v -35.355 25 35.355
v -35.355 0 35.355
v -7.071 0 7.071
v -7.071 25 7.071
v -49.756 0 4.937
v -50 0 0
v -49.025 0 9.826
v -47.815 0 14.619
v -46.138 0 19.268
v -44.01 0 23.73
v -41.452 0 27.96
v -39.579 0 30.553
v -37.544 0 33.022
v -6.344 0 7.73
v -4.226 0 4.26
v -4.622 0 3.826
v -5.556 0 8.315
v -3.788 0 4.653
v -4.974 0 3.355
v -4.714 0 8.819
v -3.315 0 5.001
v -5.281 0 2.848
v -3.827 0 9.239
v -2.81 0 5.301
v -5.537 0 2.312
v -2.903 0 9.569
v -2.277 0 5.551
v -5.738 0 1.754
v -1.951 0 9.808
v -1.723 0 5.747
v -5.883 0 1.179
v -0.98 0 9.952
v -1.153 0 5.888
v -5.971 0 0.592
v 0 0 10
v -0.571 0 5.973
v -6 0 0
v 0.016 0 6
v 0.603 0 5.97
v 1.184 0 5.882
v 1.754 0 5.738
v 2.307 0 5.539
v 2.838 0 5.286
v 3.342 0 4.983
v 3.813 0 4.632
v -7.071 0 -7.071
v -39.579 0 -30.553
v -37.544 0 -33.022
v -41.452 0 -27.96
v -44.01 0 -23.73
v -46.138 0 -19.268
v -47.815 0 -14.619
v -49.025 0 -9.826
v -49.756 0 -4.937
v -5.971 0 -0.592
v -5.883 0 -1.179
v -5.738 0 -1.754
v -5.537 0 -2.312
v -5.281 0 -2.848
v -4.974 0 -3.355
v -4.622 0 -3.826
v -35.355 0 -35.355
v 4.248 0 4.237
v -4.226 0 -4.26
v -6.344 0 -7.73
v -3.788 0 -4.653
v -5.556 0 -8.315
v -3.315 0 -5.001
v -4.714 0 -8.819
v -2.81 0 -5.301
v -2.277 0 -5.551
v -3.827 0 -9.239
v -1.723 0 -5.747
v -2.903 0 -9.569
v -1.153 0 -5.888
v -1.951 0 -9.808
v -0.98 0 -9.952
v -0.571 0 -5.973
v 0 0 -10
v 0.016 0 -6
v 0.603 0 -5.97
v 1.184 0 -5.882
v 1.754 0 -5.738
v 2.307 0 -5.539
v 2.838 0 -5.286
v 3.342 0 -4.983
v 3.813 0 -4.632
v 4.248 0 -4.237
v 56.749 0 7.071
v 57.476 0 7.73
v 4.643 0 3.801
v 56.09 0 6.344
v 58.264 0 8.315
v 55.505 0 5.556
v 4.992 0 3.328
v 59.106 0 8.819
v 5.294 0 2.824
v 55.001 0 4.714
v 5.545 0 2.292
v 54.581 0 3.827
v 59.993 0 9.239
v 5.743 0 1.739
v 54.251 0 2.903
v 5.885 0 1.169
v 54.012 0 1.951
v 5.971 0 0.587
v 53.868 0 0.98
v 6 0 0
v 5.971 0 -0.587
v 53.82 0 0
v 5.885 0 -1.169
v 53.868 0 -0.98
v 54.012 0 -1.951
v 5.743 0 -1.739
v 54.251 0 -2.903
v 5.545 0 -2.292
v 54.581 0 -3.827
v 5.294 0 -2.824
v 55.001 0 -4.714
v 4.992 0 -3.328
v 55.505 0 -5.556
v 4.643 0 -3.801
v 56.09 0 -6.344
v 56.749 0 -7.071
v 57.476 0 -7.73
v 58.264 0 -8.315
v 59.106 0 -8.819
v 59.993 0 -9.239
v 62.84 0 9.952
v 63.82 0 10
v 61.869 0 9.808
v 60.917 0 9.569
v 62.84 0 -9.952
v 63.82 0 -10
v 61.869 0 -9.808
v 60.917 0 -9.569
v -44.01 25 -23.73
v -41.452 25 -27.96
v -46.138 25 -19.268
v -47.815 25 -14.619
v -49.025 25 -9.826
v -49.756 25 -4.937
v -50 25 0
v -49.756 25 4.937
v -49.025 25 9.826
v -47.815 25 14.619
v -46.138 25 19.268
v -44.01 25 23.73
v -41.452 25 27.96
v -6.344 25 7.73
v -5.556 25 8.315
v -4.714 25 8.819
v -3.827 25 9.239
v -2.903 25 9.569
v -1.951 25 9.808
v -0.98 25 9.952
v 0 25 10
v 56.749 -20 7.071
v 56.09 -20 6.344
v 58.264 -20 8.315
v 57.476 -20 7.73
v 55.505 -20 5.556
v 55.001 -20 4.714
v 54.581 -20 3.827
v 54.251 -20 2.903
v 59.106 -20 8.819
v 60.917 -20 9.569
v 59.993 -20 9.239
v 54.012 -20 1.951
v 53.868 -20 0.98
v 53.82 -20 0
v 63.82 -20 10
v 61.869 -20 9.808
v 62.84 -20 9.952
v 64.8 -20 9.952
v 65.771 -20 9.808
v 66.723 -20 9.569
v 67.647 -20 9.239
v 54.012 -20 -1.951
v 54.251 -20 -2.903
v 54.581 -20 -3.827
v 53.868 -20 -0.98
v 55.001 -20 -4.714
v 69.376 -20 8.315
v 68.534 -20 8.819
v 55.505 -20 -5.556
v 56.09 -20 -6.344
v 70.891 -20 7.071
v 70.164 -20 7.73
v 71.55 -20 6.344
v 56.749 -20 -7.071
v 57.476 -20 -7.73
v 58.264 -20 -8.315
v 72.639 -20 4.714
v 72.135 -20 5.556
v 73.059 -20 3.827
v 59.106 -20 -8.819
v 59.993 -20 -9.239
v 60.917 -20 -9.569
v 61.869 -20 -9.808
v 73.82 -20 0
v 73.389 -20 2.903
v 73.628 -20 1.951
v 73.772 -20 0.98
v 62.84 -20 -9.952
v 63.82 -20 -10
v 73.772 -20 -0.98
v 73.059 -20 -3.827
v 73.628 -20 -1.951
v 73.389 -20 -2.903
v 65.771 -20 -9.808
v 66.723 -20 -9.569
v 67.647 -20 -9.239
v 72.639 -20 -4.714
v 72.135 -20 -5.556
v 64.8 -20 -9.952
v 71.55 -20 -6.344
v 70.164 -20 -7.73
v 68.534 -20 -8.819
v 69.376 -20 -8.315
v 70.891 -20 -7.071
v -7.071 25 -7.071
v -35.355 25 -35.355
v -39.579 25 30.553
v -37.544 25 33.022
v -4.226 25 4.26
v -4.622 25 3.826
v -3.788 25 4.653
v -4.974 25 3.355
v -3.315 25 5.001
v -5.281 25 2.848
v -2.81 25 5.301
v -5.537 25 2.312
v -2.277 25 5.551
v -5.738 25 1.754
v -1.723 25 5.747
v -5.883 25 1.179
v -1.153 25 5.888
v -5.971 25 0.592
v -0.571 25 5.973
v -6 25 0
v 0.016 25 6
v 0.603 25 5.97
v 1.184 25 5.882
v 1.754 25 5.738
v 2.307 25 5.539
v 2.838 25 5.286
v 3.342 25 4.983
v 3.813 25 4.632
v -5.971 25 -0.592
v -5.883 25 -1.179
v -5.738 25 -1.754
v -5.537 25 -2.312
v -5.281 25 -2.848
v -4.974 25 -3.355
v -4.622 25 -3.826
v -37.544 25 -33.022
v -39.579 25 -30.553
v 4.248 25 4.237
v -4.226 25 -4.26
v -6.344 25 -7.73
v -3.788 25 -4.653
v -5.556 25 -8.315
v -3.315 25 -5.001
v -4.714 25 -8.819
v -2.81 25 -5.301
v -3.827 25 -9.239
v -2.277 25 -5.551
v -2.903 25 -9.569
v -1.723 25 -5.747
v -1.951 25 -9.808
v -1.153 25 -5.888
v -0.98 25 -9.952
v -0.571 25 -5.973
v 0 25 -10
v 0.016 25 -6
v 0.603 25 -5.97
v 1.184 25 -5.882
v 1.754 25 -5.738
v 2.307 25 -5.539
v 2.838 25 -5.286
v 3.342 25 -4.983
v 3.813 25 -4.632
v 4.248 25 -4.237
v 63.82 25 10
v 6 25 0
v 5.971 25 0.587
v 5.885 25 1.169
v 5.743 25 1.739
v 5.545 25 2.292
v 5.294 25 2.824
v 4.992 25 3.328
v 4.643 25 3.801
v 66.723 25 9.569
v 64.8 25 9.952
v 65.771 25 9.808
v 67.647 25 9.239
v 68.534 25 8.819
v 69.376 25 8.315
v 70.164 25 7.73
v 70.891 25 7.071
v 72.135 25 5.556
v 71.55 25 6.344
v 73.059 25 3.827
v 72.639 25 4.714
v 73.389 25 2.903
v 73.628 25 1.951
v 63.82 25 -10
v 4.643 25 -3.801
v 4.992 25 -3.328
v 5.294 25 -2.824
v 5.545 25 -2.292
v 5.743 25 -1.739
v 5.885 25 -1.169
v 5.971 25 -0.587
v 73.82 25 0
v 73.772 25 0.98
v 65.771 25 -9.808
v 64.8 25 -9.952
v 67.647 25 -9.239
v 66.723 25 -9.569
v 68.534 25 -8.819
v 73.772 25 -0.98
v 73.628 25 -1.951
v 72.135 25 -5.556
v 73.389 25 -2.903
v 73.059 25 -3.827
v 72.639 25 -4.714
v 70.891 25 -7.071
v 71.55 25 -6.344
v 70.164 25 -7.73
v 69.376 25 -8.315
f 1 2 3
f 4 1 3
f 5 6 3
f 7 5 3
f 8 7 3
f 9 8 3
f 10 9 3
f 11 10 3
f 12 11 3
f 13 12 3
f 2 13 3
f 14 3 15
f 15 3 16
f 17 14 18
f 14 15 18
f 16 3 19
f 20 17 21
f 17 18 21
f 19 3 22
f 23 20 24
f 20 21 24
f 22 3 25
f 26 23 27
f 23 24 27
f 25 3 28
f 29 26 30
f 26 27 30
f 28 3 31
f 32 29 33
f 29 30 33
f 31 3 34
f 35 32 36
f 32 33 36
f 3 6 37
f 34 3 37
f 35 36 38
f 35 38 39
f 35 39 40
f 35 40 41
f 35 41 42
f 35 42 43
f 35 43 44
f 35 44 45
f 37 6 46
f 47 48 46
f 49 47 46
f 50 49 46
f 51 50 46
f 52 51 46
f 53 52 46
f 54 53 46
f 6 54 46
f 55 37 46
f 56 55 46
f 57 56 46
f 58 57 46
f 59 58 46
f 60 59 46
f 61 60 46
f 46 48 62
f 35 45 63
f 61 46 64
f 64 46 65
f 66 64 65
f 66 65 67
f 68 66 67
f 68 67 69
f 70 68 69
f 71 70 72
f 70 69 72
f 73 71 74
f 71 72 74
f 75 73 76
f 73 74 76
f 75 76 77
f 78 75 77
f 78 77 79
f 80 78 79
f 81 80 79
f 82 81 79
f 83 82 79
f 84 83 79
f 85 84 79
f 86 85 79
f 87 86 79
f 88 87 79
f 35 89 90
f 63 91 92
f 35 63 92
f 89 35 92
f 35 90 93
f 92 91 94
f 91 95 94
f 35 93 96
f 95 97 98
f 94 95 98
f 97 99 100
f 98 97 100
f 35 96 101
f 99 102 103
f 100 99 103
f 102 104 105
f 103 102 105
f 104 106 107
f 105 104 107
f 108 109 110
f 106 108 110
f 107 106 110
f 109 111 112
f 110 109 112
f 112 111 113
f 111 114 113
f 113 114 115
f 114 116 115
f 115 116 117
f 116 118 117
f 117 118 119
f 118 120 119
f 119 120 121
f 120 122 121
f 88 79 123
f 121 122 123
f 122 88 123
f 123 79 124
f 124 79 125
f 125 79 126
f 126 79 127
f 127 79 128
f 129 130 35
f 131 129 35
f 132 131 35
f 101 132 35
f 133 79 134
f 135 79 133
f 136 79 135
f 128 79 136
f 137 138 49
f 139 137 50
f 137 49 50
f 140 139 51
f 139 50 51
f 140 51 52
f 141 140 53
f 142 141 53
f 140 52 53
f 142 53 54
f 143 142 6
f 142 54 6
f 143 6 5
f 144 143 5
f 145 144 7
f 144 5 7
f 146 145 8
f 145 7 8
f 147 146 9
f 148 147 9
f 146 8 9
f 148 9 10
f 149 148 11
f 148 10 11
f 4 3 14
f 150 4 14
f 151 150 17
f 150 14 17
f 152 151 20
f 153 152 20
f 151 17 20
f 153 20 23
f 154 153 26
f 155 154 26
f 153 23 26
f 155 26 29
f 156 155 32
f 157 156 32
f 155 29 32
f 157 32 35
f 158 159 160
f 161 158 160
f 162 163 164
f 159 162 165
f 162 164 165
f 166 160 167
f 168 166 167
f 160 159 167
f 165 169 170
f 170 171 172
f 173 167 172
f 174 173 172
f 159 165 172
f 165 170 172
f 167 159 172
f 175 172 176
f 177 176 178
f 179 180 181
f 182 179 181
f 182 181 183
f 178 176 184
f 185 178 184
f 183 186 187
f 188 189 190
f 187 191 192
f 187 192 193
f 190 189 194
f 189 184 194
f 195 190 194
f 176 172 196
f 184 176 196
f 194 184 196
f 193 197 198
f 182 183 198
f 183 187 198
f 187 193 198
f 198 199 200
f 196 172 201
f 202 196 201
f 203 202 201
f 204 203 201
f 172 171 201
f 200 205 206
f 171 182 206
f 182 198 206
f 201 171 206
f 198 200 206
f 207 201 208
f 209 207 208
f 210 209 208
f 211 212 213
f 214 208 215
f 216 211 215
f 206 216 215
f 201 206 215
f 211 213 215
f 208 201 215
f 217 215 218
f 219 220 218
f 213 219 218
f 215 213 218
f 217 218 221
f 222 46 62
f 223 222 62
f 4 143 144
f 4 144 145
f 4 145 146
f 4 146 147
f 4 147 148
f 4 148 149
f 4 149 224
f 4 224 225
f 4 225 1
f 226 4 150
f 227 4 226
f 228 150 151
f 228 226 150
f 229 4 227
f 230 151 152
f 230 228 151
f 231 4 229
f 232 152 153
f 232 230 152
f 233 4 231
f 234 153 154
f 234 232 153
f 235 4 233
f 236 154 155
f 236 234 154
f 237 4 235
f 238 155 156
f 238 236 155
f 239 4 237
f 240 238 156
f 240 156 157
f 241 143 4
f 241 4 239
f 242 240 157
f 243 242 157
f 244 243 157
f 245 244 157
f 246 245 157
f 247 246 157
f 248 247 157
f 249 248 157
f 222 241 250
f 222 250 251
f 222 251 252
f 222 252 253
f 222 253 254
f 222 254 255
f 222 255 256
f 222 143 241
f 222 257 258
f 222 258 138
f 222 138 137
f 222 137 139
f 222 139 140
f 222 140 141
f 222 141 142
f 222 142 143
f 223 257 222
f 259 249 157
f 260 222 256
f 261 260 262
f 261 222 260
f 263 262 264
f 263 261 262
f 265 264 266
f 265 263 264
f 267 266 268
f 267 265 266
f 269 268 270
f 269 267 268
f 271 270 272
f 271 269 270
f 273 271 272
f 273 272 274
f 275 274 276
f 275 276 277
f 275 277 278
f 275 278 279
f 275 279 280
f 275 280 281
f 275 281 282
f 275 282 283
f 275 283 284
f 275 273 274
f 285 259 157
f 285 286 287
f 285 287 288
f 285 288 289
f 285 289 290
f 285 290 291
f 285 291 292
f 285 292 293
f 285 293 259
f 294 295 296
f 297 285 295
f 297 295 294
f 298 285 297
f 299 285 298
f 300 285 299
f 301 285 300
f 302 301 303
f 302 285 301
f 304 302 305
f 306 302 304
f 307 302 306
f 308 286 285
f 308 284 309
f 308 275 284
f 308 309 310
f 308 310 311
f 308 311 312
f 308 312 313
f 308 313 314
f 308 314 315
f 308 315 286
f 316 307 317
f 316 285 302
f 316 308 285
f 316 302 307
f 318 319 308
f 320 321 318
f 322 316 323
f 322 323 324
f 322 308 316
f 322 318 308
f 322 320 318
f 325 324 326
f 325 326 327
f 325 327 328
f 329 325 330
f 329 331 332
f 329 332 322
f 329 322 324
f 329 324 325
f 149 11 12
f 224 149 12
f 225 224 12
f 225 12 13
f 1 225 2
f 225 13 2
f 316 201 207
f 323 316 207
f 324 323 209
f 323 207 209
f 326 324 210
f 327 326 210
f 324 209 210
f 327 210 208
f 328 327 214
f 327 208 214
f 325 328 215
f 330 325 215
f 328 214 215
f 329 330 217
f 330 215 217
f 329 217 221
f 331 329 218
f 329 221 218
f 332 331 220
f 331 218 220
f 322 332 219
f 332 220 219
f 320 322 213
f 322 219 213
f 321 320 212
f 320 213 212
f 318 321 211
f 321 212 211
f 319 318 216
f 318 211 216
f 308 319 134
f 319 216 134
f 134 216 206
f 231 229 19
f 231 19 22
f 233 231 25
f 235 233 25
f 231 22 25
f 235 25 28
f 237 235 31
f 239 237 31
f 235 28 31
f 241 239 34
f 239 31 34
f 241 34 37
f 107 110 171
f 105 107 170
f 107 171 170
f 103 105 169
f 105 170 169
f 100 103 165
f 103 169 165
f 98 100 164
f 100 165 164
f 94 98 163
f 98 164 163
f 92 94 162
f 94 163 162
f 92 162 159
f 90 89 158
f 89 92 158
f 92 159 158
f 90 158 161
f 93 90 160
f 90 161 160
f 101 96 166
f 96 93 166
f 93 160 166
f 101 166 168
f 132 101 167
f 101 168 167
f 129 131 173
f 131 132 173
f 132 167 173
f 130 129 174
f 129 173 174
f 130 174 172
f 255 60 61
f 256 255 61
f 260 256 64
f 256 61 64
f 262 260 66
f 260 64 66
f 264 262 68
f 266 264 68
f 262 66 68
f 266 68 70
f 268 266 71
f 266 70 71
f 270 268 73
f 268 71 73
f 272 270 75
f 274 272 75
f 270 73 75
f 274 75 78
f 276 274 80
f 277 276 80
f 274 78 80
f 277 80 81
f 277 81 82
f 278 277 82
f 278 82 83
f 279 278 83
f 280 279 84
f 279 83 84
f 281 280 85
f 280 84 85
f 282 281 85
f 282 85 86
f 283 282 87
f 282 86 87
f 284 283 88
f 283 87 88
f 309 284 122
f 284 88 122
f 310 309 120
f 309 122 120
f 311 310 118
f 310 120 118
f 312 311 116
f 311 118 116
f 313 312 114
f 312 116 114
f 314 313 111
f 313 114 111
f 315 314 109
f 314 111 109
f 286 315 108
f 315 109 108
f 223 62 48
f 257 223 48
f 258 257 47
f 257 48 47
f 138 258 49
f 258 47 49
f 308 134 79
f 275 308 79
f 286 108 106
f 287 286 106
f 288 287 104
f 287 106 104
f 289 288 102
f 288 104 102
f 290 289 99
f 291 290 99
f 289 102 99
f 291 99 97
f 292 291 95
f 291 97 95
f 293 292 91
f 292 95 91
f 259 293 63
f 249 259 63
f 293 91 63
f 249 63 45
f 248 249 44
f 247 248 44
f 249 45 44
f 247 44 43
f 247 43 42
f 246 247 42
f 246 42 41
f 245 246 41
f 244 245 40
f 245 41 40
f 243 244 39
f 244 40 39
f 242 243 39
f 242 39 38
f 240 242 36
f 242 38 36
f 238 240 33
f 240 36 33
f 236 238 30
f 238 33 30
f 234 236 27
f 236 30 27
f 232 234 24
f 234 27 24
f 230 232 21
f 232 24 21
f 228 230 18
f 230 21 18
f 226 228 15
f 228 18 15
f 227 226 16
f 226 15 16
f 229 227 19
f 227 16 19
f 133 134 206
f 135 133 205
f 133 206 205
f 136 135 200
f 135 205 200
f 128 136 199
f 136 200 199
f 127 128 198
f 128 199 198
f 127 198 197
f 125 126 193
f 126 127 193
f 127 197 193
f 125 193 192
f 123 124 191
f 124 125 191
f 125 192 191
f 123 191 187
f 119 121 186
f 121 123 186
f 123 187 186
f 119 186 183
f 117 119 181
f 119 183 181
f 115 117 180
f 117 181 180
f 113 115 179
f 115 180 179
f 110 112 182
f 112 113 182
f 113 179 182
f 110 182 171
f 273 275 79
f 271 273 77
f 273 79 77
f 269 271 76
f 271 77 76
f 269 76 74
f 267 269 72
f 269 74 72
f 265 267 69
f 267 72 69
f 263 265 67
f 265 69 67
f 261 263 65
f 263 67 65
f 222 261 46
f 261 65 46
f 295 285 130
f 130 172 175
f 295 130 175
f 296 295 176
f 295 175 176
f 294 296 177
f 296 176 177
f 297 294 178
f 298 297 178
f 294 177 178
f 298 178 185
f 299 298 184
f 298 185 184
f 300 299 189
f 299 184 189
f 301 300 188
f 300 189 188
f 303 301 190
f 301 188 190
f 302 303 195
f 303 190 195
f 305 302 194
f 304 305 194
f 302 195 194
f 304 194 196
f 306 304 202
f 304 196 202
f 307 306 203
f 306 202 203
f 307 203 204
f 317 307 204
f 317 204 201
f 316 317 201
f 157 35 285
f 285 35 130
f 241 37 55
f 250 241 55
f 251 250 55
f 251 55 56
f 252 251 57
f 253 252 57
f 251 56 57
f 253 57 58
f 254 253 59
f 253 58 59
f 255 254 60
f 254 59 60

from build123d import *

# Parameters (mm, degrees)
SKETCH_2_R           = 6
EXTRUDE_1_DEPTH      = 25
EXTRUDE_2_DEPTH      = 25
EXTRUDE_2_DEPTH_BACK = 20
SKETCH_2_3_R         = 10
EXTRUDE_START        = -25
EXTRUDE_3_DEPTH      = 25


with BuildPart() as part:
    # 草图2 → 凸台-拉伸1 (new body)
    with BuildSketch(Plane(origin=(0, 0, 0), x_dir=(1, 0, 0), z_dir=(0, 1, 0))):
        with BuildLine():
            ThreePointArc((0, 10), (-4.694715628, 8.829475929), (-8.290375726, 5.591929035))
            Line((-8.290375726, 5.591929035), (-41.451878628, 27.959645174))
            ThreePointArc((-41.451878628, 27.959645174), (-50, 0), (-41.451878628, -27.959645174))
            Line((-41.451878628, -27.959645174), (-8.290375726, -5.591929035))
            ThreePointArc((-8.290375726, -5.591929035), (-4.694715628, -8.829475929), (0, -10))
            Line((0, -10), (63.82, -10))
            ThreePointArc((63.82, -10), (53.82, 0), (63.82, 10))
            Line((63.82, 10), (0, 10))
        make_face()
        Circle(SKETCH_2_R, mode=Mode.SUBTRACT)
    extrude(amount=EXTRUDE_1_DEPTH)

    # 草图2<3> → 凸台-拉伸2 (add, two sides: drawn at the far end of the back side and taken through both)
    with BuildSketch(Plane(origin=(0, 0, 0), x_dir=(1, 0, 0), z_dir=(0, 1, 0)).offset(-EXTRUDE_2_DEPTH_BACK)):
        with Locations((63.82, 0)):
            Circle(SKETCH_2_3_R)
    extrude(amount=EXTRUDE_2_DEPTH + EXTRUDE_2_DEPTH_BACK)

    # 草图3 → 凸台-拉伸3 (add)
    with BuildSketch(Plane(origin=(0, 25, 0), x_dir=(1, 0, 0), z_dir=(0, 1, 0)).offset(EXTRUDE_START)):
        with BuildLine():
            ThreePointArc((-8.290375726, 5.591929035), (-7.716245834, 6.360782203), (-7.071067812, 7.071067812))
            Line((-7.071067812, 7.071067812), (-35.355339059, 35.355339059))
            ThreePointArc((-35.355339059, 35.355339059), (-38.581229169, 31.803911014), (-41.451878628, 27.959645174))
            Line((-41.451878628, 27.959645174), (-8.290375726, 5.591929035))
        make_face()
        with BuildLine():
            Line((-35.355339059, -35.355339059), (-7.071067812, -7.071067812))
            ThreePointArc((-7.071067812, -7.071067812), (-7.716245834, -6.360782203), (-8.290375726, -5.591929035))
            Line((-8.290375726, -5.591929035), (-41.451878628, -27.959645174))
            ThreePointArc((-41.451878628, -27.959645174), (-38.581229169, -31.803911014), (-35.355339059, -35.355339059))
        make_face()
    extrude(amount=EXTRUDE_3_DEPTH)


solid = part.part
